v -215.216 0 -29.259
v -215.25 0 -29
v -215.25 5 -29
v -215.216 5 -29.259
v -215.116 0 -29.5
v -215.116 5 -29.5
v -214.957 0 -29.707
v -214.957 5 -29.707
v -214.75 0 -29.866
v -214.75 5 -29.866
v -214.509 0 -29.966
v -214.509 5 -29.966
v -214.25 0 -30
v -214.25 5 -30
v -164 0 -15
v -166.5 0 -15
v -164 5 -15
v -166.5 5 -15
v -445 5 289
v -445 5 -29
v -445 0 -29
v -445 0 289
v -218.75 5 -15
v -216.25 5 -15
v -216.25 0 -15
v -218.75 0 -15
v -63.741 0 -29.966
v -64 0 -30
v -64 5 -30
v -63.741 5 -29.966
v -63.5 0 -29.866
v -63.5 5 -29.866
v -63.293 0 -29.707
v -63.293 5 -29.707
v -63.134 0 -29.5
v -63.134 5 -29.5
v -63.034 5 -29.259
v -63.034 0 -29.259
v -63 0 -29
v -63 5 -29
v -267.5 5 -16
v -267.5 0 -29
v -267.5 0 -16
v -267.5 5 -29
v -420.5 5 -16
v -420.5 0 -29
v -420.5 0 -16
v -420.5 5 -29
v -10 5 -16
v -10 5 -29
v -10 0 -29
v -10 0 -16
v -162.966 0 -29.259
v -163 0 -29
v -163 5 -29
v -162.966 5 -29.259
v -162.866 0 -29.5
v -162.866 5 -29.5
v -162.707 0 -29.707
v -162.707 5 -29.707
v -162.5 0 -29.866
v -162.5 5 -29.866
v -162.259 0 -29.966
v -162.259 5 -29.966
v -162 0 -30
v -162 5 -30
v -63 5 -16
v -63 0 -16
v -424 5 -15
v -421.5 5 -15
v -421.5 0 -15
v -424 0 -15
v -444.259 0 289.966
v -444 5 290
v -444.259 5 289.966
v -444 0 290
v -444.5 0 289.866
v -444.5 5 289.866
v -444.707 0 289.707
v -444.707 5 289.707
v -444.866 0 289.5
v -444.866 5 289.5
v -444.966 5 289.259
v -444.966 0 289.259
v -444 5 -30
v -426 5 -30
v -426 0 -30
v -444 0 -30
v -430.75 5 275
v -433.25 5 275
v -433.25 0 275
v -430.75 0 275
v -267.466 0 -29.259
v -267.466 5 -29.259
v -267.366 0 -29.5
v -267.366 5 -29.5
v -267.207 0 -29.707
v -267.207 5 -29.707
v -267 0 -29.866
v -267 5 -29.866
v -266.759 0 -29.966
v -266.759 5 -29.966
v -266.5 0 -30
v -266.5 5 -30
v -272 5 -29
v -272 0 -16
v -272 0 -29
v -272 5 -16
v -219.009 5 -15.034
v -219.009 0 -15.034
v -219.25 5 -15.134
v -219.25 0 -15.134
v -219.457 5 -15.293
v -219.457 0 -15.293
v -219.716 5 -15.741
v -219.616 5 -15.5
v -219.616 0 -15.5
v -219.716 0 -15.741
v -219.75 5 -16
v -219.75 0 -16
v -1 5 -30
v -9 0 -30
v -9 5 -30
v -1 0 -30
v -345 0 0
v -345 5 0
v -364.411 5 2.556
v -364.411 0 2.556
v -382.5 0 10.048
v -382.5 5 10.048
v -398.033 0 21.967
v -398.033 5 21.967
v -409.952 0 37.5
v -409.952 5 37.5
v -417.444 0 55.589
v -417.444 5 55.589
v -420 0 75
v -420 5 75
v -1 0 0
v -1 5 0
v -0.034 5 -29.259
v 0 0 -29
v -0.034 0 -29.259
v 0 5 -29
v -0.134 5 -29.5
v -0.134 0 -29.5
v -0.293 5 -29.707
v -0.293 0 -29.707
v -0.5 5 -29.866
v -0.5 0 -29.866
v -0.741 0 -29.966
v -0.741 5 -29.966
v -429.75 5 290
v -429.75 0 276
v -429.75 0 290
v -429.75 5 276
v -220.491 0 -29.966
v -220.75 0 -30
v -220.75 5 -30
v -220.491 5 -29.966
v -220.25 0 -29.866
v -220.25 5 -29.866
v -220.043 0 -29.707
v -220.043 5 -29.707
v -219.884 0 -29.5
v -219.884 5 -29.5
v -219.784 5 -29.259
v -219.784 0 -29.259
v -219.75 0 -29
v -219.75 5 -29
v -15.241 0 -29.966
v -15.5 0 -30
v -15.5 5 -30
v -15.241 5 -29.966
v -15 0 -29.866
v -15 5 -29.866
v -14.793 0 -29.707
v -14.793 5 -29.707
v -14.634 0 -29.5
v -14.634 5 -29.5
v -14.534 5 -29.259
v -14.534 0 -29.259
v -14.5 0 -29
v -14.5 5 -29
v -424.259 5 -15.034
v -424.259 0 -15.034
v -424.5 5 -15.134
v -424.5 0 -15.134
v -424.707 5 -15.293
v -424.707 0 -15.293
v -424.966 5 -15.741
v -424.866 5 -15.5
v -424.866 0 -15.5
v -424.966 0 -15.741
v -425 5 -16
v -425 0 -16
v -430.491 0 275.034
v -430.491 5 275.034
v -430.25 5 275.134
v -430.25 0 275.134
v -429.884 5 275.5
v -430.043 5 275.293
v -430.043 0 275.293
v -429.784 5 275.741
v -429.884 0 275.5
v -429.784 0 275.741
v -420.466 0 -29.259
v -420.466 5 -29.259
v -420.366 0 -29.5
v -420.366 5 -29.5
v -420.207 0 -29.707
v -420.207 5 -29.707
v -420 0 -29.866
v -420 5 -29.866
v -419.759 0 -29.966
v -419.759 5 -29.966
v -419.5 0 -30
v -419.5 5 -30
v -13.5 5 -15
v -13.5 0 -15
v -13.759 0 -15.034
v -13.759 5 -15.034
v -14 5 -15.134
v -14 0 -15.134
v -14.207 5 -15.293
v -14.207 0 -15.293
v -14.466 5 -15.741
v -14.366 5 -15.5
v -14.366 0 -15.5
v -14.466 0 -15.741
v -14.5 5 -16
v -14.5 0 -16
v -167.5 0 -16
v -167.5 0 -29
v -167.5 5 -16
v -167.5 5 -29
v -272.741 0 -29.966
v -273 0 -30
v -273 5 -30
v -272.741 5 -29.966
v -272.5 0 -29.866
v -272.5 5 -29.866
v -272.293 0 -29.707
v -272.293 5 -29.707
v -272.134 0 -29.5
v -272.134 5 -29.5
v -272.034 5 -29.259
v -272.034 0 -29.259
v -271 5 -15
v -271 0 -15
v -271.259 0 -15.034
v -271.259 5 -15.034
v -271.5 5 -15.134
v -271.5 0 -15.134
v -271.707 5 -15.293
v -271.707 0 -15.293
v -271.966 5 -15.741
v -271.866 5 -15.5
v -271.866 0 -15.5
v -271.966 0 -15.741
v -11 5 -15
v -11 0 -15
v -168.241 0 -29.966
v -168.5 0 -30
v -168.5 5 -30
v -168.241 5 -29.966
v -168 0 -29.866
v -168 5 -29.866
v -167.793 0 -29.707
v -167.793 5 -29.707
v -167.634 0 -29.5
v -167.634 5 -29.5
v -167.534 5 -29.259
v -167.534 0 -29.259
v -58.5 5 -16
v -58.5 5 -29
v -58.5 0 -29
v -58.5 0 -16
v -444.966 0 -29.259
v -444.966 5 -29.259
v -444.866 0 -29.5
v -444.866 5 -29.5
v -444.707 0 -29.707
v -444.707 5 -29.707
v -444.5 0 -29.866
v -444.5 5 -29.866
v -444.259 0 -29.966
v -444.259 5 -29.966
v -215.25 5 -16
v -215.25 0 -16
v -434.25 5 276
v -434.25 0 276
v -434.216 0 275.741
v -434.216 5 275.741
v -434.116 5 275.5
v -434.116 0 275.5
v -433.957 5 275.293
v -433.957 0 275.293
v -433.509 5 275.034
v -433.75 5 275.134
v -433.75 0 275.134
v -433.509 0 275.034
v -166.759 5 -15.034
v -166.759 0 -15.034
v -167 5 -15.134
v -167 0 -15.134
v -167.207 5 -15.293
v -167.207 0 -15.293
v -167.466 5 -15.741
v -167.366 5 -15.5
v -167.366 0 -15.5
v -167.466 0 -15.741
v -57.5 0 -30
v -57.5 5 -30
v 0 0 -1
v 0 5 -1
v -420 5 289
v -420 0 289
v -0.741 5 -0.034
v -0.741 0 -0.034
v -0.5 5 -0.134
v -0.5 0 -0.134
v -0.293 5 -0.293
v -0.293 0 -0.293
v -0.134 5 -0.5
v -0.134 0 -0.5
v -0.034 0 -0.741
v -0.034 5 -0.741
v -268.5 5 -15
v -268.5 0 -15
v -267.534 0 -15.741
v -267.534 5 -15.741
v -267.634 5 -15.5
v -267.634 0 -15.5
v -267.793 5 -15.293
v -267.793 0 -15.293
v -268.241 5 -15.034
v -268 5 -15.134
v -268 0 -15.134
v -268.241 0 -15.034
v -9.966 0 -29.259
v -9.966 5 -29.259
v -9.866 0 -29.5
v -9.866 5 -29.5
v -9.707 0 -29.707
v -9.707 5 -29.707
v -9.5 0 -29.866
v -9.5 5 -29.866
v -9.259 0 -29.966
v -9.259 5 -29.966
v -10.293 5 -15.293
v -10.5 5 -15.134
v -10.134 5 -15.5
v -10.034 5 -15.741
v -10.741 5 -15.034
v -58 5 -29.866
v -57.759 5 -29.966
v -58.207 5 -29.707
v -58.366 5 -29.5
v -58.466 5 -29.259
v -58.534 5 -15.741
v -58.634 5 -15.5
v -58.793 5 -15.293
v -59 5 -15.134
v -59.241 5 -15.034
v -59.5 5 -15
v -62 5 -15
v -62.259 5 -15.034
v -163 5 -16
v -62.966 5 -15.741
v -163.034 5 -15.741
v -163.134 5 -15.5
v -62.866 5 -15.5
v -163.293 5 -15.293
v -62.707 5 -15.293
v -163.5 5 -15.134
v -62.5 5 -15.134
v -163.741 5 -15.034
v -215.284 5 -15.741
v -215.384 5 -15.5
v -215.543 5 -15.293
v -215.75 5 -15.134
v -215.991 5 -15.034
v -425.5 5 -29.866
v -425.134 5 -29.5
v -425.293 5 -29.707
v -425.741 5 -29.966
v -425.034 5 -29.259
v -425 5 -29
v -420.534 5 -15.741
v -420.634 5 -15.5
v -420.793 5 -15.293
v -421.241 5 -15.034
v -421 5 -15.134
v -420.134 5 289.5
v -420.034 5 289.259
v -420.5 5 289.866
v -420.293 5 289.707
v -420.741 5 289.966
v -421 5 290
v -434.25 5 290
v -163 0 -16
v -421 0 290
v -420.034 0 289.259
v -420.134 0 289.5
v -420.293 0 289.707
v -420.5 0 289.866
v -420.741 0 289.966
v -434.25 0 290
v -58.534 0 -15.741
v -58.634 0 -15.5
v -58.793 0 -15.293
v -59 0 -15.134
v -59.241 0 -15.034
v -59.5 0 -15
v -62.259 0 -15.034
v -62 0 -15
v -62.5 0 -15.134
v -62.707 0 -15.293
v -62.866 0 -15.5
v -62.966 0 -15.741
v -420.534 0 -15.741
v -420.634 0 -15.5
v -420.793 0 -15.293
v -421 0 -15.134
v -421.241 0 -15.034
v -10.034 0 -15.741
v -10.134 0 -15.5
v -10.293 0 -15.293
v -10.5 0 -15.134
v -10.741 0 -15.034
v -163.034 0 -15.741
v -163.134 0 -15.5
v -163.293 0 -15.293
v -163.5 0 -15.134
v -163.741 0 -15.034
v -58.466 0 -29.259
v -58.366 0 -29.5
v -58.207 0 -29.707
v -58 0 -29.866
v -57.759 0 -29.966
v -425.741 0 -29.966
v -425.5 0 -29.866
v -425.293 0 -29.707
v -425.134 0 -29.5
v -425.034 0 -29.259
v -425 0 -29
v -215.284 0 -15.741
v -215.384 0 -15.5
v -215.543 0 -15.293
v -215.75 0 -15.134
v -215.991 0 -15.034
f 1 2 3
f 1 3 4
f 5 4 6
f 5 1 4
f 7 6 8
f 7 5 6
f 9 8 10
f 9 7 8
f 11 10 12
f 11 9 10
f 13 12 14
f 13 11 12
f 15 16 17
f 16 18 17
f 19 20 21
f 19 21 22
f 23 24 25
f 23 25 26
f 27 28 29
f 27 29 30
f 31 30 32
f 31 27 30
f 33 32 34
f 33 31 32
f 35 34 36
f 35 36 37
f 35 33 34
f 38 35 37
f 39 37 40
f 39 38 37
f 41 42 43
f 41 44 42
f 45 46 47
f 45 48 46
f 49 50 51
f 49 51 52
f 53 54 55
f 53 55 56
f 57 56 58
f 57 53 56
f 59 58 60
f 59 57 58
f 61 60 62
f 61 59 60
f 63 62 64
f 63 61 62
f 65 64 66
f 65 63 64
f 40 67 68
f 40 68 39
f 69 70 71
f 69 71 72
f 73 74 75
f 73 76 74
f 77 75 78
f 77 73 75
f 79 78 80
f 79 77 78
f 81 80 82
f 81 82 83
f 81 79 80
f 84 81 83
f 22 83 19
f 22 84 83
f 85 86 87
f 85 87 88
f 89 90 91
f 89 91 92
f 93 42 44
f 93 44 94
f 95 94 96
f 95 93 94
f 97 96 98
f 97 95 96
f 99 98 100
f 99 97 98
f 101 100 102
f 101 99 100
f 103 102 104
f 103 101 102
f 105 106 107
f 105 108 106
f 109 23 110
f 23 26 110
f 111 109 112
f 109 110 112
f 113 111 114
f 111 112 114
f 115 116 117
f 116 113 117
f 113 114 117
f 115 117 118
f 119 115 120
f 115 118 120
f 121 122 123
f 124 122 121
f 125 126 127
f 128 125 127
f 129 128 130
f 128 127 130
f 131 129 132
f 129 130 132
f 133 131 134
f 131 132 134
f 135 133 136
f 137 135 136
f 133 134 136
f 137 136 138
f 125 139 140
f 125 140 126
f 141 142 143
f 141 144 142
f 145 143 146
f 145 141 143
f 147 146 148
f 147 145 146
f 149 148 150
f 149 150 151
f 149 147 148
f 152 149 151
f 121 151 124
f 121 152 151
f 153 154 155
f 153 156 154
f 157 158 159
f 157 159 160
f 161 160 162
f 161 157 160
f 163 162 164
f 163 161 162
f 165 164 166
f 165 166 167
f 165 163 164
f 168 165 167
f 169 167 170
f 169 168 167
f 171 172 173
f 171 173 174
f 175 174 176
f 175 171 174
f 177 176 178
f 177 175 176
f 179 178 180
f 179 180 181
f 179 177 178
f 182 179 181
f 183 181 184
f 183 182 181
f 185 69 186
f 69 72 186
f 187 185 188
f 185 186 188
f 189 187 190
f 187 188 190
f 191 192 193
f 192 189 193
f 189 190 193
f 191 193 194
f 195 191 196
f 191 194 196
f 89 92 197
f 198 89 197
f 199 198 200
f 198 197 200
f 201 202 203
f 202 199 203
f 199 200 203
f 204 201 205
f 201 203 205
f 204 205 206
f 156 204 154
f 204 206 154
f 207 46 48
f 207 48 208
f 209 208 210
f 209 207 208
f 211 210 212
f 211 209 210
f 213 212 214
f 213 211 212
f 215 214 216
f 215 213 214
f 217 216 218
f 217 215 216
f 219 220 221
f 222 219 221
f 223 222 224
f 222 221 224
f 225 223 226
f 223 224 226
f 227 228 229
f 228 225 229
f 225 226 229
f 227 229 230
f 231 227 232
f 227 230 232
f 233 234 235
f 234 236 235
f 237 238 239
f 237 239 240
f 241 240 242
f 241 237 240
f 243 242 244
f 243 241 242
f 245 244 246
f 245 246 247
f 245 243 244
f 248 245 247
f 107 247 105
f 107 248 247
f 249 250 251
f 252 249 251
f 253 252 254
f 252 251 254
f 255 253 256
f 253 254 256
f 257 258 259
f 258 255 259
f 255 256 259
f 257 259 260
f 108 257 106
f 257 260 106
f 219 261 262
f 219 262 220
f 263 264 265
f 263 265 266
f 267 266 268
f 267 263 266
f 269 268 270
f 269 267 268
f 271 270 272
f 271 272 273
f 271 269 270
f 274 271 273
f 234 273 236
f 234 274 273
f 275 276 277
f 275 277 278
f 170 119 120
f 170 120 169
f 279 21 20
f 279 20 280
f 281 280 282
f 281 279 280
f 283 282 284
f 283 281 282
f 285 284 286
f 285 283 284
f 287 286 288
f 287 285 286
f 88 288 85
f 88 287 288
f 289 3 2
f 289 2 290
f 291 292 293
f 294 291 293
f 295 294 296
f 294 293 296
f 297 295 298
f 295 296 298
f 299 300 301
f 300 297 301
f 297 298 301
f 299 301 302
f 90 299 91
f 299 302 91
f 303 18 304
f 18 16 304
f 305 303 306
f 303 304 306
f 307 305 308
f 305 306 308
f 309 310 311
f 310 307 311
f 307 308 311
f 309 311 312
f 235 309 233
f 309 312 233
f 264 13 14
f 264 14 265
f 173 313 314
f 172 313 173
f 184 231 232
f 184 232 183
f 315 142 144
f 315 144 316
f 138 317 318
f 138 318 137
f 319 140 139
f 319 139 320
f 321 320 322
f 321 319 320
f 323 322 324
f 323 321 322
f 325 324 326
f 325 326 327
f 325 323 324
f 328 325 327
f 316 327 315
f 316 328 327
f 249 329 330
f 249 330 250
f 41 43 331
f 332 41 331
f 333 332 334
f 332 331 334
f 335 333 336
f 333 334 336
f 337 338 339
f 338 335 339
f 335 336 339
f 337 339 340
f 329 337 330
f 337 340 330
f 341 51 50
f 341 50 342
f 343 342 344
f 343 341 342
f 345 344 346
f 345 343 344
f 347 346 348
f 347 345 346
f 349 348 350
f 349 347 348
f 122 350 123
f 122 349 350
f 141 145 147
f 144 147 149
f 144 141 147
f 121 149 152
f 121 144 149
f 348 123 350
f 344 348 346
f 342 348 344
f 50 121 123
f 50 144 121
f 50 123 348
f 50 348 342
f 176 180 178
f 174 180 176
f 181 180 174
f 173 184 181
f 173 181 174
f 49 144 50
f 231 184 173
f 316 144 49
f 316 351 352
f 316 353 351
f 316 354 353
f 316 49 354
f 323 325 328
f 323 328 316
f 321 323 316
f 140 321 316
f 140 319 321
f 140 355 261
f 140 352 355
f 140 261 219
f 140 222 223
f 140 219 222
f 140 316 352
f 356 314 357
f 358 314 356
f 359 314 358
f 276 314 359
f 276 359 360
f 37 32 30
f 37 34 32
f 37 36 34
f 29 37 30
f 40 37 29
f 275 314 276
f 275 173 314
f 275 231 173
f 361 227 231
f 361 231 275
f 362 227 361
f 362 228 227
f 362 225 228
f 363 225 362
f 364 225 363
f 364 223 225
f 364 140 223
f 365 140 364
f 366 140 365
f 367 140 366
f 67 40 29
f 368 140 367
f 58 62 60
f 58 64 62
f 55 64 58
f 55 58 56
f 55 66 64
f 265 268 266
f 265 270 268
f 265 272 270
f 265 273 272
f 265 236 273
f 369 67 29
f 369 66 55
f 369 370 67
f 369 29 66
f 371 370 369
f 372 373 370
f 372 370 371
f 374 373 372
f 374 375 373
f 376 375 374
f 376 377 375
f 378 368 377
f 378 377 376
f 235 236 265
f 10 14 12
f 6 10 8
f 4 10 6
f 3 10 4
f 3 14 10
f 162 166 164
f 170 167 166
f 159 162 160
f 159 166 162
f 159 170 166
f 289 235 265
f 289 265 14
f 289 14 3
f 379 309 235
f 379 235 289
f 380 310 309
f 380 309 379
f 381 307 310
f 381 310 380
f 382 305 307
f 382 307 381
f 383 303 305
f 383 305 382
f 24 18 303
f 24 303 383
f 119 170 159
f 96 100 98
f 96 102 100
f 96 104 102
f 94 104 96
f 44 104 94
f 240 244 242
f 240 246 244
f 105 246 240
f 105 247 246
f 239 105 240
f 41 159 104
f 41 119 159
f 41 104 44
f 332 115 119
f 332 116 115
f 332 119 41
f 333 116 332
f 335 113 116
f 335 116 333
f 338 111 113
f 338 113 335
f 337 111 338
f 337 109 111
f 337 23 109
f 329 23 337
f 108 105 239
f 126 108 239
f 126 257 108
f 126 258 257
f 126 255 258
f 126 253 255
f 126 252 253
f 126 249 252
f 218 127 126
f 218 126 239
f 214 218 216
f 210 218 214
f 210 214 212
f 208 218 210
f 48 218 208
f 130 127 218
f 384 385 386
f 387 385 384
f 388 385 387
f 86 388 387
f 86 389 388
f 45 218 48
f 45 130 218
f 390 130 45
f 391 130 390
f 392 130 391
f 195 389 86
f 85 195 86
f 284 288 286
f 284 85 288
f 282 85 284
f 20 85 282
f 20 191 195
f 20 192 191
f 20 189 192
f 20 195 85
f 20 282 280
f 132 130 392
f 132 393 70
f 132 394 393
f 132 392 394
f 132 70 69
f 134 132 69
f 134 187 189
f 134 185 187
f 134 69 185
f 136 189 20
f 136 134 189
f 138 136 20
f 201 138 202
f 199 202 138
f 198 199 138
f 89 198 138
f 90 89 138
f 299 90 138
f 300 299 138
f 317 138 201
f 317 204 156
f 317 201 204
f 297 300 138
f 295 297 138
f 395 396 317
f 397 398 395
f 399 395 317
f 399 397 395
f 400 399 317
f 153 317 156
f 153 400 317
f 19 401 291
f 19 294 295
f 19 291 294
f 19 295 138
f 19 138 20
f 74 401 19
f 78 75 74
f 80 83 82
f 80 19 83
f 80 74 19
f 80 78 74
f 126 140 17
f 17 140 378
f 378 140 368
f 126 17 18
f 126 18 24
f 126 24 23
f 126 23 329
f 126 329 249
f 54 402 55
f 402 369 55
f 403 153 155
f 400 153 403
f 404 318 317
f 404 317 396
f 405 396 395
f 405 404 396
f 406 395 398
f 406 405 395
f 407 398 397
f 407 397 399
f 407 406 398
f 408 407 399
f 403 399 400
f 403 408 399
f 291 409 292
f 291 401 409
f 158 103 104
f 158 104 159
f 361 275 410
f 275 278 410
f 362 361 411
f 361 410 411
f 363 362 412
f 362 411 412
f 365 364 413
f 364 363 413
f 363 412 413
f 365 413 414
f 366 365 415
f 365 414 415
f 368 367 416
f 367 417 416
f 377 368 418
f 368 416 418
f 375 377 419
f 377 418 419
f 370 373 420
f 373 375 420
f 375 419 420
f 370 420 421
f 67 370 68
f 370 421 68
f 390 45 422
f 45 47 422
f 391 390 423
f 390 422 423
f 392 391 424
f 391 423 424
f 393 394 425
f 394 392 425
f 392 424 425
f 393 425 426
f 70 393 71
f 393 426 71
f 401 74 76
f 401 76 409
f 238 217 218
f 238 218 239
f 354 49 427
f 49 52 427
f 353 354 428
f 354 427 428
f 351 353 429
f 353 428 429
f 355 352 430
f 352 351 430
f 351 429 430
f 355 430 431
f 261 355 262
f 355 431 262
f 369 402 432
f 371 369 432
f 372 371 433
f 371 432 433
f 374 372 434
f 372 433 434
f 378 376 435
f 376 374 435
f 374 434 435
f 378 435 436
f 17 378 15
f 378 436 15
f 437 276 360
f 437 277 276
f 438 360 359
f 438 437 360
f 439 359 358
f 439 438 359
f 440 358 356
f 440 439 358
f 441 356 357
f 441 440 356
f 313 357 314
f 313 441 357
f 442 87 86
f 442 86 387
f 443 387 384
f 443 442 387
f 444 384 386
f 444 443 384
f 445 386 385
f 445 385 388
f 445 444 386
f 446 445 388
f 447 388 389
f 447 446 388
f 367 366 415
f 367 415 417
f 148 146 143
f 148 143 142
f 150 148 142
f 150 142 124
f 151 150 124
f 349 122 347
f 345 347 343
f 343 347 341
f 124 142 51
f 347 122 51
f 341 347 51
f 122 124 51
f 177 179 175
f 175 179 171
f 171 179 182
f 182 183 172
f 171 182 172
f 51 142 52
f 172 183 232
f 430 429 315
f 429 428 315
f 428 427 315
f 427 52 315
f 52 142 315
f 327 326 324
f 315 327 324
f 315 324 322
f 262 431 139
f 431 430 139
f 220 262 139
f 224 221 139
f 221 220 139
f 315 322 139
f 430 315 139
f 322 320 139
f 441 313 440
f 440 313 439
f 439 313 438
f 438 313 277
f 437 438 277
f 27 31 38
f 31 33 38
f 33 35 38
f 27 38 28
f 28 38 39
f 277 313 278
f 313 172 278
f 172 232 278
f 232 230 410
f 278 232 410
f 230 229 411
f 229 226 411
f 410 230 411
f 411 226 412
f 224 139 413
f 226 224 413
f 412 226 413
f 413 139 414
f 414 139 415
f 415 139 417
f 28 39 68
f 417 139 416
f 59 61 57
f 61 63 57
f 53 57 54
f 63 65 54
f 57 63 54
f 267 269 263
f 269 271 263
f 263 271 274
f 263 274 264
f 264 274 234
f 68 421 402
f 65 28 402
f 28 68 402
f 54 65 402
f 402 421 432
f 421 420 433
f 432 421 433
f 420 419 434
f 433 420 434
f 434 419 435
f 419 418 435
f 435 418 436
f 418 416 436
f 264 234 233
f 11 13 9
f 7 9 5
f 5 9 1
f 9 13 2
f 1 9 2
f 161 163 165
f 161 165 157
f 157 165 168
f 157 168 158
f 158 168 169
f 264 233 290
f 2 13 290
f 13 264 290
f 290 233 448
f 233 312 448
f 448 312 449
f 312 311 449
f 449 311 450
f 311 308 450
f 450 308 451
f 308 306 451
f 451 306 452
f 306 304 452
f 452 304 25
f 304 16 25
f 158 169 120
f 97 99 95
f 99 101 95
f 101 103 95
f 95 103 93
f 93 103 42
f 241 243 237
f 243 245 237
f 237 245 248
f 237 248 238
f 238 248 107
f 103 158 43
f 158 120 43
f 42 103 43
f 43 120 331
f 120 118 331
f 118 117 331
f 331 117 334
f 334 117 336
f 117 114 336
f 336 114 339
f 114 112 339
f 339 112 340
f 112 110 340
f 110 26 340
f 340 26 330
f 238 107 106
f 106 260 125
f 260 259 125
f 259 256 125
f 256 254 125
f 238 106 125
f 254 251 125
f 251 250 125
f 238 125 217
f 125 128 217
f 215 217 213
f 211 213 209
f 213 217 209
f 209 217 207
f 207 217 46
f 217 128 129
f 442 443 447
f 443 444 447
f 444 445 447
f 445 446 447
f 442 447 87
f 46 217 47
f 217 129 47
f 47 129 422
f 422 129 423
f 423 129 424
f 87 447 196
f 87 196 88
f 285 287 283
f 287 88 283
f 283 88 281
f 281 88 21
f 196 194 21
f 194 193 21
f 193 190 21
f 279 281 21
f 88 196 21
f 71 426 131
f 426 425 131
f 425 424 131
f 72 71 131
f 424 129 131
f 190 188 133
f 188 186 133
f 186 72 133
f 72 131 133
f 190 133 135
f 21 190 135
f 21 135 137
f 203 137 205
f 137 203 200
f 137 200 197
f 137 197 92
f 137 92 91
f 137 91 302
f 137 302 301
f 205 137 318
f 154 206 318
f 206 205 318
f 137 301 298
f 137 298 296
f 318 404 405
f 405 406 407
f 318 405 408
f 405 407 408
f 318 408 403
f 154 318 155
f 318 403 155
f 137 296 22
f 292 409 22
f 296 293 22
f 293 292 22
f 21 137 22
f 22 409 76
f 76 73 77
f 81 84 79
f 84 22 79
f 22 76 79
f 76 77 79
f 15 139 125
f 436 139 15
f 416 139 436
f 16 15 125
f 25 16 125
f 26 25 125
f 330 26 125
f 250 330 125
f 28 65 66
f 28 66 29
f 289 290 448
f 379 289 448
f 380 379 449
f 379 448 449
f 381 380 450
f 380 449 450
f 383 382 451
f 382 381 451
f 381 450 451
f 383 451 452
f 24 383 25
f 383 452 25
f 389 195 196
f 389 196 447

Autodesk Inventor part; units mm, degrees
ref_plane "YZ Plane" through (0, 0, 0) normal (1, 0, 0) x (0, 1, 0)
ref_plane "XZ Plane" through (0, 0, 0) normal (0, 1, 0) x (-1, 0, 0)
ref_plane "XY Plane" through (0, 0, 0) normal (0, 0, 1) x (1, 0, 0)
sketch "Sketch1" plane through (0, 0, 0) normal (0, 1, 0) x (-1, 0, 0)
  line L0 (0, 0) -> (435, 0)
  line L1 (435, 0) -> (435, -30)
  line L2 (435, -30) -> (0, -30)
  line L3 (0, -30) -> (0, 0)
  dimension "d0" = 435
  dimension "d1" = 30
extrude "Extrusion1" add sketch "Sketch1" along normal blind 5
sketch "Sketch2" plane through (0, 5, 0) normal (0, 1, 0) x (1, 0, 0)
  line L0 (0, 30) -> (-435, 30) projected
  line L1 (-435, 30) -> (-425, 30)
  line L2 (-425, 30) -> (-420.5, 30)
  line L3 (-420.5, 30) -> (-420.5, 15)
  line L4 (-420.5, 15) -> (-425, 15)
  line L5 (-425, 15) -> (-425, 30)
  line L6 (-420.5, 30) -> (-219.75, 30)
  line L7 (-219.75, 30) -> (-215.25, 30)
  line L8 (-215.25, 30) -> (-215.25, 15)
  line L9 (-215.25, 15) -> (-219.75, 15)
  line L10 (-219.75, 15) -> (-219.75, 30)
  line L11 (-215.25, 30) -> (-14.5, 30)
  line L12 (-14.5, 30) -> (-10, 30)
  line L13 (-10, 30) -> (-10, 15)
  line L14 (-10, 15) -> (-14.5, 15)
  line L15 (-14.5, 15) -> (-14.5, 30)
  point P0 (0, 0)
  dimension "d4" = 10
  dimension "d5" = 4.5
  dimension "d6" = 15
  dimension "d7" = 200.75
  dimension "d8" = 4.5
  dimension "d9" = 15
  dimension "d10" = 200.75
  dimension "d11" = 4.5
  dimension "d12" = 15
extrude "Extrusion2" cut sketch "Sketch2" against normal blind 5
sketch "Sketch3" plane through (0, 5, 0) normal (0, 1, 0) x (1, 0, 0)
  line L0 (-435, 30) -> (-435, 0) projected
  line L1 (-435, 30) -> (-445, 30)
  line L2 (-445, 30) -> (-445, -290)
  line L3 (-445, -290) -> (-435, -290)
  line L4 (-435, -290) -> (-435, 30)
  line L5 (-435, -290) -> (-420, -290)
  line L6 (-420, -290) -> (-420, 15)
  line L7 (-420, 15) -> (-435, 15)
  line L8 (-435, 15) -> (-435, -290)
  point P0 (0, 0)
  dimension "d15" = 10
  dimension "d16" = 320
  dimension "d17" = 15
  dimension "d18" = 305
extrude "Extrusion3" add sketch "Sketch3" against normal blind 5
fillet "Fillet1" radius 75 1 edges at (-420, 2.5, 0)
sketch "Sketch4" plane through (0, 5, 0) normal (0, 1, 0) x (1, 0, 0)
  line L0 (-10, 15) -> (-14.5, 15) projected
  line L1 (-14.5, 15) -> (-58.5, 15)
  line L2 (-345, 0) -> (0, 0) projected
  line L3 (-58.5, 15) -> (-63, 15)
  line L4 (-63, 15) -> (-63, 0)
  line L5 (-63, 0) -> (-58.5, 0)
  line L6 (-58.5, 0) -> (-58.5, 15)
  line L7 (-63, 0) -> (-110.75, 0)
  line L8 (-110.75, 0) -> (-115.25, 0)
  line L9 (-115.25, 0) -> (-115.25, 15)
  line L10 (-115.25, 15) -> (-110.75, 15)
  line L11 (-110.75, 15) -> (-110.75, 0)
  line L12 (-115.25, 0) -> (-163, 0)
  line L13 (-163, 0) -> (-215.25, 0)
  line L14 (-215.25, 0) -> (-219.75, 0)
  line L15 (-163, 0) -> (-167.5, 0)
  line L16 (-167.5, 0) -> (-167.5, 15)
  line L17 (-167.5, 15) -> (-163, 15)
  line L18 (-163, 15) -> (-163, 0)
  line L19 (-217.5, 0) -> (-217.5, 32.2246)
  line L20 (-372, 0) -> (-324.25, 0)
  line L21 (-324.25, 0) -> (-319.75, 0)
  line L22 (-319.75, 0) -> (-319.75, 15)
  line L23 (-319.75, 15) -> (-324.25, 15)
  line L24 (-324.25, 15) -> (-324.25, 0)
  line L25 (-319.75, 0) -> (-272, 0)
  line L26 (-272, 0) -> (-267.5, 0)
  line L27 (-267.5, 0) -> (-267.5, 15)
  line L28 (-267.5, 15) -> (-272, 15)
  line L29 (-272, 15) -> (-272, 0)
  line L30 (-372, 0) -> (-376.5, 0)
  line L31 (-376.5, 0) -> (-376.5, 30)
  line L32 (-376.5, 30) -> (-372, 30)
  line L33 (-372, 30) -> (-372, 0)
  line L34 (-376.5, 30) -> (-372, 30)
  line L35 (-372, 30) -> (-372, 15)
  line L36 (-372, 15) -> (-376.5, 15)
  line L37 (-376.5, 15) -> (-376.5, 30)
  line L38 (-14.5, 15) -> (-459.3643, 15)
  line L39 (-63, 15) -> (-63, 30)
  line L40 (-63, 30) -> (-58.5, 30)
  line L41 (-58.5, 30) -> (-58.5, 15)
  line L42 (-63, 30) -> (-110.75, 30)
  line L43 (-110.75, 30) -> (-115.25, 30)
  line L44 (-115.25, 30) -> (-115.25, 15)
  line L45 (-110.75, 15) -> (-110.75, 30)
  line L46 (-115.25, 30) -> (-163, 30)
  line L47 (-163, 30) -> (-215.25, 30)
  line L48 (-215.25, 30) -> (-219.75, 30)
  line L49 (-163, 30) -> (-167.5, 30)
  line L50 (-167.5, 30) -> (-167.5, 15)
  line L51 (-163, 15) -> (-163, 30)
  line L52 (-267.5, 30) -> (-267.5, 15)
  line L53 (-272, 30) -> (-267.5, 30)
  line L54 (-272, 15) -> (-272, 30)
  line L55 (-319.75, 30) -> (-272, 30)
  line L56 (-319.75, 30) -> (-319.75, 15)
  line L57 (-324.25, 30) -> (-319.75, 30)
  line L58 (-324.25, 15) -> (-324.25, 30)
  line L59 (-372, 30) -> (-324.25, 30)
  line L60 (-372, 30) -> (-376.5, 30)
  line L61 (-324.25, 0) -> (-319.75, 0)
  line L62 (-319.75, 0) -> (-319.75, -4.5)
  line L63 (-319.75, -4.5) -> (-324.25, -4.5)
  line L64 (-324.25, -4.5) -> (-324.25, 0)
  point P0 (-345, 30)
  point P1 (-217.5, 30)
  dimension "d22" = 44
  dimension "d23" = 4.5
  dimension "d24" = 47.75
  dimension "d25" = 4.5
  dimension "d26" = 15
  dimension "d27" = 47.75
  dimension "d28" = 52.25
  dimension "d29" = 4.5
  dimension "d30" = 4.5
  dimension "d31" = 15
  dimension "d38" = 4.5
  dimension "d39" = 30
  dimension "d45" = 4.5
extrude "Extrusion4" cut sketch "Sketch4" against normal blind 5 contours L54 L53 L52 L28 | L50 L47 L51 L17 | L39 L40 L41 L3
sketch "Sketch6" plane through (0, 5, 0) normal (0, 1, 0) x (1, 0, 0)
  line L0 (-420, -75) -> (-420, -290) projected
  line L1 (-420, -290) -> (-429.75, -290)
  line L2 (-420, -290) -> (-445, -290) projected
  line L3 (-429.75, -290) -> (-434.25, -290)
  line L4 (-434.25, -290) -> (-434.25, -275)
  line L5 (-434.25, -275) -> (-429.75, -275)
  line L6 (-429.75, -275) -> (-429.75, -290)
  point P0 (0, 0)
  dimension "d40" = 9.75
  dimension "d41" = 4.5
  dimension "d42" = 15
extrude "Extrusion6" cut sketch "Sketch6" against normal blind 5
fillet "Fillet2" radius 1 31 edges at (-10, 2.5, -15) (-14.5, 2.5, -15) (0, 2.5, 0) (0, 2.5, -30) (-14.5, 2.5, -30) (-10, 2.5, -30) (-58.5, 2.5, -30) (-58.5, 2.5, -15) (-63, 2.5, -15) (-63, 2.5, -30) (-163, 2.5, -30) (-167.5, 2.5, -30) (-163, 2.5, -15) (-167.5, 2.5, -15) (-215.25, 2.5, -15) (-219.75, 2.5, -15) (-219.75, 2.5, -30) (-215.25, 2.5, -30) (-272, 2.5, -30) (-267.5, 2.5, -30) (-267.5, 2.5, -15) (-272, 2.5, -15) (-420.5, 2.5, -30) (-425, 2.5, -30) (-420.5, 2.5, -15) (-425, 2.5, -15) (-445, 2.5, -30) (-420, 2.5, 290) (-434.25, 2.5, 275) (-429.75, 2.5, 275) (-445, 2.5, 290)
properties part number "slats_back_over" material "Foam Core Board"
